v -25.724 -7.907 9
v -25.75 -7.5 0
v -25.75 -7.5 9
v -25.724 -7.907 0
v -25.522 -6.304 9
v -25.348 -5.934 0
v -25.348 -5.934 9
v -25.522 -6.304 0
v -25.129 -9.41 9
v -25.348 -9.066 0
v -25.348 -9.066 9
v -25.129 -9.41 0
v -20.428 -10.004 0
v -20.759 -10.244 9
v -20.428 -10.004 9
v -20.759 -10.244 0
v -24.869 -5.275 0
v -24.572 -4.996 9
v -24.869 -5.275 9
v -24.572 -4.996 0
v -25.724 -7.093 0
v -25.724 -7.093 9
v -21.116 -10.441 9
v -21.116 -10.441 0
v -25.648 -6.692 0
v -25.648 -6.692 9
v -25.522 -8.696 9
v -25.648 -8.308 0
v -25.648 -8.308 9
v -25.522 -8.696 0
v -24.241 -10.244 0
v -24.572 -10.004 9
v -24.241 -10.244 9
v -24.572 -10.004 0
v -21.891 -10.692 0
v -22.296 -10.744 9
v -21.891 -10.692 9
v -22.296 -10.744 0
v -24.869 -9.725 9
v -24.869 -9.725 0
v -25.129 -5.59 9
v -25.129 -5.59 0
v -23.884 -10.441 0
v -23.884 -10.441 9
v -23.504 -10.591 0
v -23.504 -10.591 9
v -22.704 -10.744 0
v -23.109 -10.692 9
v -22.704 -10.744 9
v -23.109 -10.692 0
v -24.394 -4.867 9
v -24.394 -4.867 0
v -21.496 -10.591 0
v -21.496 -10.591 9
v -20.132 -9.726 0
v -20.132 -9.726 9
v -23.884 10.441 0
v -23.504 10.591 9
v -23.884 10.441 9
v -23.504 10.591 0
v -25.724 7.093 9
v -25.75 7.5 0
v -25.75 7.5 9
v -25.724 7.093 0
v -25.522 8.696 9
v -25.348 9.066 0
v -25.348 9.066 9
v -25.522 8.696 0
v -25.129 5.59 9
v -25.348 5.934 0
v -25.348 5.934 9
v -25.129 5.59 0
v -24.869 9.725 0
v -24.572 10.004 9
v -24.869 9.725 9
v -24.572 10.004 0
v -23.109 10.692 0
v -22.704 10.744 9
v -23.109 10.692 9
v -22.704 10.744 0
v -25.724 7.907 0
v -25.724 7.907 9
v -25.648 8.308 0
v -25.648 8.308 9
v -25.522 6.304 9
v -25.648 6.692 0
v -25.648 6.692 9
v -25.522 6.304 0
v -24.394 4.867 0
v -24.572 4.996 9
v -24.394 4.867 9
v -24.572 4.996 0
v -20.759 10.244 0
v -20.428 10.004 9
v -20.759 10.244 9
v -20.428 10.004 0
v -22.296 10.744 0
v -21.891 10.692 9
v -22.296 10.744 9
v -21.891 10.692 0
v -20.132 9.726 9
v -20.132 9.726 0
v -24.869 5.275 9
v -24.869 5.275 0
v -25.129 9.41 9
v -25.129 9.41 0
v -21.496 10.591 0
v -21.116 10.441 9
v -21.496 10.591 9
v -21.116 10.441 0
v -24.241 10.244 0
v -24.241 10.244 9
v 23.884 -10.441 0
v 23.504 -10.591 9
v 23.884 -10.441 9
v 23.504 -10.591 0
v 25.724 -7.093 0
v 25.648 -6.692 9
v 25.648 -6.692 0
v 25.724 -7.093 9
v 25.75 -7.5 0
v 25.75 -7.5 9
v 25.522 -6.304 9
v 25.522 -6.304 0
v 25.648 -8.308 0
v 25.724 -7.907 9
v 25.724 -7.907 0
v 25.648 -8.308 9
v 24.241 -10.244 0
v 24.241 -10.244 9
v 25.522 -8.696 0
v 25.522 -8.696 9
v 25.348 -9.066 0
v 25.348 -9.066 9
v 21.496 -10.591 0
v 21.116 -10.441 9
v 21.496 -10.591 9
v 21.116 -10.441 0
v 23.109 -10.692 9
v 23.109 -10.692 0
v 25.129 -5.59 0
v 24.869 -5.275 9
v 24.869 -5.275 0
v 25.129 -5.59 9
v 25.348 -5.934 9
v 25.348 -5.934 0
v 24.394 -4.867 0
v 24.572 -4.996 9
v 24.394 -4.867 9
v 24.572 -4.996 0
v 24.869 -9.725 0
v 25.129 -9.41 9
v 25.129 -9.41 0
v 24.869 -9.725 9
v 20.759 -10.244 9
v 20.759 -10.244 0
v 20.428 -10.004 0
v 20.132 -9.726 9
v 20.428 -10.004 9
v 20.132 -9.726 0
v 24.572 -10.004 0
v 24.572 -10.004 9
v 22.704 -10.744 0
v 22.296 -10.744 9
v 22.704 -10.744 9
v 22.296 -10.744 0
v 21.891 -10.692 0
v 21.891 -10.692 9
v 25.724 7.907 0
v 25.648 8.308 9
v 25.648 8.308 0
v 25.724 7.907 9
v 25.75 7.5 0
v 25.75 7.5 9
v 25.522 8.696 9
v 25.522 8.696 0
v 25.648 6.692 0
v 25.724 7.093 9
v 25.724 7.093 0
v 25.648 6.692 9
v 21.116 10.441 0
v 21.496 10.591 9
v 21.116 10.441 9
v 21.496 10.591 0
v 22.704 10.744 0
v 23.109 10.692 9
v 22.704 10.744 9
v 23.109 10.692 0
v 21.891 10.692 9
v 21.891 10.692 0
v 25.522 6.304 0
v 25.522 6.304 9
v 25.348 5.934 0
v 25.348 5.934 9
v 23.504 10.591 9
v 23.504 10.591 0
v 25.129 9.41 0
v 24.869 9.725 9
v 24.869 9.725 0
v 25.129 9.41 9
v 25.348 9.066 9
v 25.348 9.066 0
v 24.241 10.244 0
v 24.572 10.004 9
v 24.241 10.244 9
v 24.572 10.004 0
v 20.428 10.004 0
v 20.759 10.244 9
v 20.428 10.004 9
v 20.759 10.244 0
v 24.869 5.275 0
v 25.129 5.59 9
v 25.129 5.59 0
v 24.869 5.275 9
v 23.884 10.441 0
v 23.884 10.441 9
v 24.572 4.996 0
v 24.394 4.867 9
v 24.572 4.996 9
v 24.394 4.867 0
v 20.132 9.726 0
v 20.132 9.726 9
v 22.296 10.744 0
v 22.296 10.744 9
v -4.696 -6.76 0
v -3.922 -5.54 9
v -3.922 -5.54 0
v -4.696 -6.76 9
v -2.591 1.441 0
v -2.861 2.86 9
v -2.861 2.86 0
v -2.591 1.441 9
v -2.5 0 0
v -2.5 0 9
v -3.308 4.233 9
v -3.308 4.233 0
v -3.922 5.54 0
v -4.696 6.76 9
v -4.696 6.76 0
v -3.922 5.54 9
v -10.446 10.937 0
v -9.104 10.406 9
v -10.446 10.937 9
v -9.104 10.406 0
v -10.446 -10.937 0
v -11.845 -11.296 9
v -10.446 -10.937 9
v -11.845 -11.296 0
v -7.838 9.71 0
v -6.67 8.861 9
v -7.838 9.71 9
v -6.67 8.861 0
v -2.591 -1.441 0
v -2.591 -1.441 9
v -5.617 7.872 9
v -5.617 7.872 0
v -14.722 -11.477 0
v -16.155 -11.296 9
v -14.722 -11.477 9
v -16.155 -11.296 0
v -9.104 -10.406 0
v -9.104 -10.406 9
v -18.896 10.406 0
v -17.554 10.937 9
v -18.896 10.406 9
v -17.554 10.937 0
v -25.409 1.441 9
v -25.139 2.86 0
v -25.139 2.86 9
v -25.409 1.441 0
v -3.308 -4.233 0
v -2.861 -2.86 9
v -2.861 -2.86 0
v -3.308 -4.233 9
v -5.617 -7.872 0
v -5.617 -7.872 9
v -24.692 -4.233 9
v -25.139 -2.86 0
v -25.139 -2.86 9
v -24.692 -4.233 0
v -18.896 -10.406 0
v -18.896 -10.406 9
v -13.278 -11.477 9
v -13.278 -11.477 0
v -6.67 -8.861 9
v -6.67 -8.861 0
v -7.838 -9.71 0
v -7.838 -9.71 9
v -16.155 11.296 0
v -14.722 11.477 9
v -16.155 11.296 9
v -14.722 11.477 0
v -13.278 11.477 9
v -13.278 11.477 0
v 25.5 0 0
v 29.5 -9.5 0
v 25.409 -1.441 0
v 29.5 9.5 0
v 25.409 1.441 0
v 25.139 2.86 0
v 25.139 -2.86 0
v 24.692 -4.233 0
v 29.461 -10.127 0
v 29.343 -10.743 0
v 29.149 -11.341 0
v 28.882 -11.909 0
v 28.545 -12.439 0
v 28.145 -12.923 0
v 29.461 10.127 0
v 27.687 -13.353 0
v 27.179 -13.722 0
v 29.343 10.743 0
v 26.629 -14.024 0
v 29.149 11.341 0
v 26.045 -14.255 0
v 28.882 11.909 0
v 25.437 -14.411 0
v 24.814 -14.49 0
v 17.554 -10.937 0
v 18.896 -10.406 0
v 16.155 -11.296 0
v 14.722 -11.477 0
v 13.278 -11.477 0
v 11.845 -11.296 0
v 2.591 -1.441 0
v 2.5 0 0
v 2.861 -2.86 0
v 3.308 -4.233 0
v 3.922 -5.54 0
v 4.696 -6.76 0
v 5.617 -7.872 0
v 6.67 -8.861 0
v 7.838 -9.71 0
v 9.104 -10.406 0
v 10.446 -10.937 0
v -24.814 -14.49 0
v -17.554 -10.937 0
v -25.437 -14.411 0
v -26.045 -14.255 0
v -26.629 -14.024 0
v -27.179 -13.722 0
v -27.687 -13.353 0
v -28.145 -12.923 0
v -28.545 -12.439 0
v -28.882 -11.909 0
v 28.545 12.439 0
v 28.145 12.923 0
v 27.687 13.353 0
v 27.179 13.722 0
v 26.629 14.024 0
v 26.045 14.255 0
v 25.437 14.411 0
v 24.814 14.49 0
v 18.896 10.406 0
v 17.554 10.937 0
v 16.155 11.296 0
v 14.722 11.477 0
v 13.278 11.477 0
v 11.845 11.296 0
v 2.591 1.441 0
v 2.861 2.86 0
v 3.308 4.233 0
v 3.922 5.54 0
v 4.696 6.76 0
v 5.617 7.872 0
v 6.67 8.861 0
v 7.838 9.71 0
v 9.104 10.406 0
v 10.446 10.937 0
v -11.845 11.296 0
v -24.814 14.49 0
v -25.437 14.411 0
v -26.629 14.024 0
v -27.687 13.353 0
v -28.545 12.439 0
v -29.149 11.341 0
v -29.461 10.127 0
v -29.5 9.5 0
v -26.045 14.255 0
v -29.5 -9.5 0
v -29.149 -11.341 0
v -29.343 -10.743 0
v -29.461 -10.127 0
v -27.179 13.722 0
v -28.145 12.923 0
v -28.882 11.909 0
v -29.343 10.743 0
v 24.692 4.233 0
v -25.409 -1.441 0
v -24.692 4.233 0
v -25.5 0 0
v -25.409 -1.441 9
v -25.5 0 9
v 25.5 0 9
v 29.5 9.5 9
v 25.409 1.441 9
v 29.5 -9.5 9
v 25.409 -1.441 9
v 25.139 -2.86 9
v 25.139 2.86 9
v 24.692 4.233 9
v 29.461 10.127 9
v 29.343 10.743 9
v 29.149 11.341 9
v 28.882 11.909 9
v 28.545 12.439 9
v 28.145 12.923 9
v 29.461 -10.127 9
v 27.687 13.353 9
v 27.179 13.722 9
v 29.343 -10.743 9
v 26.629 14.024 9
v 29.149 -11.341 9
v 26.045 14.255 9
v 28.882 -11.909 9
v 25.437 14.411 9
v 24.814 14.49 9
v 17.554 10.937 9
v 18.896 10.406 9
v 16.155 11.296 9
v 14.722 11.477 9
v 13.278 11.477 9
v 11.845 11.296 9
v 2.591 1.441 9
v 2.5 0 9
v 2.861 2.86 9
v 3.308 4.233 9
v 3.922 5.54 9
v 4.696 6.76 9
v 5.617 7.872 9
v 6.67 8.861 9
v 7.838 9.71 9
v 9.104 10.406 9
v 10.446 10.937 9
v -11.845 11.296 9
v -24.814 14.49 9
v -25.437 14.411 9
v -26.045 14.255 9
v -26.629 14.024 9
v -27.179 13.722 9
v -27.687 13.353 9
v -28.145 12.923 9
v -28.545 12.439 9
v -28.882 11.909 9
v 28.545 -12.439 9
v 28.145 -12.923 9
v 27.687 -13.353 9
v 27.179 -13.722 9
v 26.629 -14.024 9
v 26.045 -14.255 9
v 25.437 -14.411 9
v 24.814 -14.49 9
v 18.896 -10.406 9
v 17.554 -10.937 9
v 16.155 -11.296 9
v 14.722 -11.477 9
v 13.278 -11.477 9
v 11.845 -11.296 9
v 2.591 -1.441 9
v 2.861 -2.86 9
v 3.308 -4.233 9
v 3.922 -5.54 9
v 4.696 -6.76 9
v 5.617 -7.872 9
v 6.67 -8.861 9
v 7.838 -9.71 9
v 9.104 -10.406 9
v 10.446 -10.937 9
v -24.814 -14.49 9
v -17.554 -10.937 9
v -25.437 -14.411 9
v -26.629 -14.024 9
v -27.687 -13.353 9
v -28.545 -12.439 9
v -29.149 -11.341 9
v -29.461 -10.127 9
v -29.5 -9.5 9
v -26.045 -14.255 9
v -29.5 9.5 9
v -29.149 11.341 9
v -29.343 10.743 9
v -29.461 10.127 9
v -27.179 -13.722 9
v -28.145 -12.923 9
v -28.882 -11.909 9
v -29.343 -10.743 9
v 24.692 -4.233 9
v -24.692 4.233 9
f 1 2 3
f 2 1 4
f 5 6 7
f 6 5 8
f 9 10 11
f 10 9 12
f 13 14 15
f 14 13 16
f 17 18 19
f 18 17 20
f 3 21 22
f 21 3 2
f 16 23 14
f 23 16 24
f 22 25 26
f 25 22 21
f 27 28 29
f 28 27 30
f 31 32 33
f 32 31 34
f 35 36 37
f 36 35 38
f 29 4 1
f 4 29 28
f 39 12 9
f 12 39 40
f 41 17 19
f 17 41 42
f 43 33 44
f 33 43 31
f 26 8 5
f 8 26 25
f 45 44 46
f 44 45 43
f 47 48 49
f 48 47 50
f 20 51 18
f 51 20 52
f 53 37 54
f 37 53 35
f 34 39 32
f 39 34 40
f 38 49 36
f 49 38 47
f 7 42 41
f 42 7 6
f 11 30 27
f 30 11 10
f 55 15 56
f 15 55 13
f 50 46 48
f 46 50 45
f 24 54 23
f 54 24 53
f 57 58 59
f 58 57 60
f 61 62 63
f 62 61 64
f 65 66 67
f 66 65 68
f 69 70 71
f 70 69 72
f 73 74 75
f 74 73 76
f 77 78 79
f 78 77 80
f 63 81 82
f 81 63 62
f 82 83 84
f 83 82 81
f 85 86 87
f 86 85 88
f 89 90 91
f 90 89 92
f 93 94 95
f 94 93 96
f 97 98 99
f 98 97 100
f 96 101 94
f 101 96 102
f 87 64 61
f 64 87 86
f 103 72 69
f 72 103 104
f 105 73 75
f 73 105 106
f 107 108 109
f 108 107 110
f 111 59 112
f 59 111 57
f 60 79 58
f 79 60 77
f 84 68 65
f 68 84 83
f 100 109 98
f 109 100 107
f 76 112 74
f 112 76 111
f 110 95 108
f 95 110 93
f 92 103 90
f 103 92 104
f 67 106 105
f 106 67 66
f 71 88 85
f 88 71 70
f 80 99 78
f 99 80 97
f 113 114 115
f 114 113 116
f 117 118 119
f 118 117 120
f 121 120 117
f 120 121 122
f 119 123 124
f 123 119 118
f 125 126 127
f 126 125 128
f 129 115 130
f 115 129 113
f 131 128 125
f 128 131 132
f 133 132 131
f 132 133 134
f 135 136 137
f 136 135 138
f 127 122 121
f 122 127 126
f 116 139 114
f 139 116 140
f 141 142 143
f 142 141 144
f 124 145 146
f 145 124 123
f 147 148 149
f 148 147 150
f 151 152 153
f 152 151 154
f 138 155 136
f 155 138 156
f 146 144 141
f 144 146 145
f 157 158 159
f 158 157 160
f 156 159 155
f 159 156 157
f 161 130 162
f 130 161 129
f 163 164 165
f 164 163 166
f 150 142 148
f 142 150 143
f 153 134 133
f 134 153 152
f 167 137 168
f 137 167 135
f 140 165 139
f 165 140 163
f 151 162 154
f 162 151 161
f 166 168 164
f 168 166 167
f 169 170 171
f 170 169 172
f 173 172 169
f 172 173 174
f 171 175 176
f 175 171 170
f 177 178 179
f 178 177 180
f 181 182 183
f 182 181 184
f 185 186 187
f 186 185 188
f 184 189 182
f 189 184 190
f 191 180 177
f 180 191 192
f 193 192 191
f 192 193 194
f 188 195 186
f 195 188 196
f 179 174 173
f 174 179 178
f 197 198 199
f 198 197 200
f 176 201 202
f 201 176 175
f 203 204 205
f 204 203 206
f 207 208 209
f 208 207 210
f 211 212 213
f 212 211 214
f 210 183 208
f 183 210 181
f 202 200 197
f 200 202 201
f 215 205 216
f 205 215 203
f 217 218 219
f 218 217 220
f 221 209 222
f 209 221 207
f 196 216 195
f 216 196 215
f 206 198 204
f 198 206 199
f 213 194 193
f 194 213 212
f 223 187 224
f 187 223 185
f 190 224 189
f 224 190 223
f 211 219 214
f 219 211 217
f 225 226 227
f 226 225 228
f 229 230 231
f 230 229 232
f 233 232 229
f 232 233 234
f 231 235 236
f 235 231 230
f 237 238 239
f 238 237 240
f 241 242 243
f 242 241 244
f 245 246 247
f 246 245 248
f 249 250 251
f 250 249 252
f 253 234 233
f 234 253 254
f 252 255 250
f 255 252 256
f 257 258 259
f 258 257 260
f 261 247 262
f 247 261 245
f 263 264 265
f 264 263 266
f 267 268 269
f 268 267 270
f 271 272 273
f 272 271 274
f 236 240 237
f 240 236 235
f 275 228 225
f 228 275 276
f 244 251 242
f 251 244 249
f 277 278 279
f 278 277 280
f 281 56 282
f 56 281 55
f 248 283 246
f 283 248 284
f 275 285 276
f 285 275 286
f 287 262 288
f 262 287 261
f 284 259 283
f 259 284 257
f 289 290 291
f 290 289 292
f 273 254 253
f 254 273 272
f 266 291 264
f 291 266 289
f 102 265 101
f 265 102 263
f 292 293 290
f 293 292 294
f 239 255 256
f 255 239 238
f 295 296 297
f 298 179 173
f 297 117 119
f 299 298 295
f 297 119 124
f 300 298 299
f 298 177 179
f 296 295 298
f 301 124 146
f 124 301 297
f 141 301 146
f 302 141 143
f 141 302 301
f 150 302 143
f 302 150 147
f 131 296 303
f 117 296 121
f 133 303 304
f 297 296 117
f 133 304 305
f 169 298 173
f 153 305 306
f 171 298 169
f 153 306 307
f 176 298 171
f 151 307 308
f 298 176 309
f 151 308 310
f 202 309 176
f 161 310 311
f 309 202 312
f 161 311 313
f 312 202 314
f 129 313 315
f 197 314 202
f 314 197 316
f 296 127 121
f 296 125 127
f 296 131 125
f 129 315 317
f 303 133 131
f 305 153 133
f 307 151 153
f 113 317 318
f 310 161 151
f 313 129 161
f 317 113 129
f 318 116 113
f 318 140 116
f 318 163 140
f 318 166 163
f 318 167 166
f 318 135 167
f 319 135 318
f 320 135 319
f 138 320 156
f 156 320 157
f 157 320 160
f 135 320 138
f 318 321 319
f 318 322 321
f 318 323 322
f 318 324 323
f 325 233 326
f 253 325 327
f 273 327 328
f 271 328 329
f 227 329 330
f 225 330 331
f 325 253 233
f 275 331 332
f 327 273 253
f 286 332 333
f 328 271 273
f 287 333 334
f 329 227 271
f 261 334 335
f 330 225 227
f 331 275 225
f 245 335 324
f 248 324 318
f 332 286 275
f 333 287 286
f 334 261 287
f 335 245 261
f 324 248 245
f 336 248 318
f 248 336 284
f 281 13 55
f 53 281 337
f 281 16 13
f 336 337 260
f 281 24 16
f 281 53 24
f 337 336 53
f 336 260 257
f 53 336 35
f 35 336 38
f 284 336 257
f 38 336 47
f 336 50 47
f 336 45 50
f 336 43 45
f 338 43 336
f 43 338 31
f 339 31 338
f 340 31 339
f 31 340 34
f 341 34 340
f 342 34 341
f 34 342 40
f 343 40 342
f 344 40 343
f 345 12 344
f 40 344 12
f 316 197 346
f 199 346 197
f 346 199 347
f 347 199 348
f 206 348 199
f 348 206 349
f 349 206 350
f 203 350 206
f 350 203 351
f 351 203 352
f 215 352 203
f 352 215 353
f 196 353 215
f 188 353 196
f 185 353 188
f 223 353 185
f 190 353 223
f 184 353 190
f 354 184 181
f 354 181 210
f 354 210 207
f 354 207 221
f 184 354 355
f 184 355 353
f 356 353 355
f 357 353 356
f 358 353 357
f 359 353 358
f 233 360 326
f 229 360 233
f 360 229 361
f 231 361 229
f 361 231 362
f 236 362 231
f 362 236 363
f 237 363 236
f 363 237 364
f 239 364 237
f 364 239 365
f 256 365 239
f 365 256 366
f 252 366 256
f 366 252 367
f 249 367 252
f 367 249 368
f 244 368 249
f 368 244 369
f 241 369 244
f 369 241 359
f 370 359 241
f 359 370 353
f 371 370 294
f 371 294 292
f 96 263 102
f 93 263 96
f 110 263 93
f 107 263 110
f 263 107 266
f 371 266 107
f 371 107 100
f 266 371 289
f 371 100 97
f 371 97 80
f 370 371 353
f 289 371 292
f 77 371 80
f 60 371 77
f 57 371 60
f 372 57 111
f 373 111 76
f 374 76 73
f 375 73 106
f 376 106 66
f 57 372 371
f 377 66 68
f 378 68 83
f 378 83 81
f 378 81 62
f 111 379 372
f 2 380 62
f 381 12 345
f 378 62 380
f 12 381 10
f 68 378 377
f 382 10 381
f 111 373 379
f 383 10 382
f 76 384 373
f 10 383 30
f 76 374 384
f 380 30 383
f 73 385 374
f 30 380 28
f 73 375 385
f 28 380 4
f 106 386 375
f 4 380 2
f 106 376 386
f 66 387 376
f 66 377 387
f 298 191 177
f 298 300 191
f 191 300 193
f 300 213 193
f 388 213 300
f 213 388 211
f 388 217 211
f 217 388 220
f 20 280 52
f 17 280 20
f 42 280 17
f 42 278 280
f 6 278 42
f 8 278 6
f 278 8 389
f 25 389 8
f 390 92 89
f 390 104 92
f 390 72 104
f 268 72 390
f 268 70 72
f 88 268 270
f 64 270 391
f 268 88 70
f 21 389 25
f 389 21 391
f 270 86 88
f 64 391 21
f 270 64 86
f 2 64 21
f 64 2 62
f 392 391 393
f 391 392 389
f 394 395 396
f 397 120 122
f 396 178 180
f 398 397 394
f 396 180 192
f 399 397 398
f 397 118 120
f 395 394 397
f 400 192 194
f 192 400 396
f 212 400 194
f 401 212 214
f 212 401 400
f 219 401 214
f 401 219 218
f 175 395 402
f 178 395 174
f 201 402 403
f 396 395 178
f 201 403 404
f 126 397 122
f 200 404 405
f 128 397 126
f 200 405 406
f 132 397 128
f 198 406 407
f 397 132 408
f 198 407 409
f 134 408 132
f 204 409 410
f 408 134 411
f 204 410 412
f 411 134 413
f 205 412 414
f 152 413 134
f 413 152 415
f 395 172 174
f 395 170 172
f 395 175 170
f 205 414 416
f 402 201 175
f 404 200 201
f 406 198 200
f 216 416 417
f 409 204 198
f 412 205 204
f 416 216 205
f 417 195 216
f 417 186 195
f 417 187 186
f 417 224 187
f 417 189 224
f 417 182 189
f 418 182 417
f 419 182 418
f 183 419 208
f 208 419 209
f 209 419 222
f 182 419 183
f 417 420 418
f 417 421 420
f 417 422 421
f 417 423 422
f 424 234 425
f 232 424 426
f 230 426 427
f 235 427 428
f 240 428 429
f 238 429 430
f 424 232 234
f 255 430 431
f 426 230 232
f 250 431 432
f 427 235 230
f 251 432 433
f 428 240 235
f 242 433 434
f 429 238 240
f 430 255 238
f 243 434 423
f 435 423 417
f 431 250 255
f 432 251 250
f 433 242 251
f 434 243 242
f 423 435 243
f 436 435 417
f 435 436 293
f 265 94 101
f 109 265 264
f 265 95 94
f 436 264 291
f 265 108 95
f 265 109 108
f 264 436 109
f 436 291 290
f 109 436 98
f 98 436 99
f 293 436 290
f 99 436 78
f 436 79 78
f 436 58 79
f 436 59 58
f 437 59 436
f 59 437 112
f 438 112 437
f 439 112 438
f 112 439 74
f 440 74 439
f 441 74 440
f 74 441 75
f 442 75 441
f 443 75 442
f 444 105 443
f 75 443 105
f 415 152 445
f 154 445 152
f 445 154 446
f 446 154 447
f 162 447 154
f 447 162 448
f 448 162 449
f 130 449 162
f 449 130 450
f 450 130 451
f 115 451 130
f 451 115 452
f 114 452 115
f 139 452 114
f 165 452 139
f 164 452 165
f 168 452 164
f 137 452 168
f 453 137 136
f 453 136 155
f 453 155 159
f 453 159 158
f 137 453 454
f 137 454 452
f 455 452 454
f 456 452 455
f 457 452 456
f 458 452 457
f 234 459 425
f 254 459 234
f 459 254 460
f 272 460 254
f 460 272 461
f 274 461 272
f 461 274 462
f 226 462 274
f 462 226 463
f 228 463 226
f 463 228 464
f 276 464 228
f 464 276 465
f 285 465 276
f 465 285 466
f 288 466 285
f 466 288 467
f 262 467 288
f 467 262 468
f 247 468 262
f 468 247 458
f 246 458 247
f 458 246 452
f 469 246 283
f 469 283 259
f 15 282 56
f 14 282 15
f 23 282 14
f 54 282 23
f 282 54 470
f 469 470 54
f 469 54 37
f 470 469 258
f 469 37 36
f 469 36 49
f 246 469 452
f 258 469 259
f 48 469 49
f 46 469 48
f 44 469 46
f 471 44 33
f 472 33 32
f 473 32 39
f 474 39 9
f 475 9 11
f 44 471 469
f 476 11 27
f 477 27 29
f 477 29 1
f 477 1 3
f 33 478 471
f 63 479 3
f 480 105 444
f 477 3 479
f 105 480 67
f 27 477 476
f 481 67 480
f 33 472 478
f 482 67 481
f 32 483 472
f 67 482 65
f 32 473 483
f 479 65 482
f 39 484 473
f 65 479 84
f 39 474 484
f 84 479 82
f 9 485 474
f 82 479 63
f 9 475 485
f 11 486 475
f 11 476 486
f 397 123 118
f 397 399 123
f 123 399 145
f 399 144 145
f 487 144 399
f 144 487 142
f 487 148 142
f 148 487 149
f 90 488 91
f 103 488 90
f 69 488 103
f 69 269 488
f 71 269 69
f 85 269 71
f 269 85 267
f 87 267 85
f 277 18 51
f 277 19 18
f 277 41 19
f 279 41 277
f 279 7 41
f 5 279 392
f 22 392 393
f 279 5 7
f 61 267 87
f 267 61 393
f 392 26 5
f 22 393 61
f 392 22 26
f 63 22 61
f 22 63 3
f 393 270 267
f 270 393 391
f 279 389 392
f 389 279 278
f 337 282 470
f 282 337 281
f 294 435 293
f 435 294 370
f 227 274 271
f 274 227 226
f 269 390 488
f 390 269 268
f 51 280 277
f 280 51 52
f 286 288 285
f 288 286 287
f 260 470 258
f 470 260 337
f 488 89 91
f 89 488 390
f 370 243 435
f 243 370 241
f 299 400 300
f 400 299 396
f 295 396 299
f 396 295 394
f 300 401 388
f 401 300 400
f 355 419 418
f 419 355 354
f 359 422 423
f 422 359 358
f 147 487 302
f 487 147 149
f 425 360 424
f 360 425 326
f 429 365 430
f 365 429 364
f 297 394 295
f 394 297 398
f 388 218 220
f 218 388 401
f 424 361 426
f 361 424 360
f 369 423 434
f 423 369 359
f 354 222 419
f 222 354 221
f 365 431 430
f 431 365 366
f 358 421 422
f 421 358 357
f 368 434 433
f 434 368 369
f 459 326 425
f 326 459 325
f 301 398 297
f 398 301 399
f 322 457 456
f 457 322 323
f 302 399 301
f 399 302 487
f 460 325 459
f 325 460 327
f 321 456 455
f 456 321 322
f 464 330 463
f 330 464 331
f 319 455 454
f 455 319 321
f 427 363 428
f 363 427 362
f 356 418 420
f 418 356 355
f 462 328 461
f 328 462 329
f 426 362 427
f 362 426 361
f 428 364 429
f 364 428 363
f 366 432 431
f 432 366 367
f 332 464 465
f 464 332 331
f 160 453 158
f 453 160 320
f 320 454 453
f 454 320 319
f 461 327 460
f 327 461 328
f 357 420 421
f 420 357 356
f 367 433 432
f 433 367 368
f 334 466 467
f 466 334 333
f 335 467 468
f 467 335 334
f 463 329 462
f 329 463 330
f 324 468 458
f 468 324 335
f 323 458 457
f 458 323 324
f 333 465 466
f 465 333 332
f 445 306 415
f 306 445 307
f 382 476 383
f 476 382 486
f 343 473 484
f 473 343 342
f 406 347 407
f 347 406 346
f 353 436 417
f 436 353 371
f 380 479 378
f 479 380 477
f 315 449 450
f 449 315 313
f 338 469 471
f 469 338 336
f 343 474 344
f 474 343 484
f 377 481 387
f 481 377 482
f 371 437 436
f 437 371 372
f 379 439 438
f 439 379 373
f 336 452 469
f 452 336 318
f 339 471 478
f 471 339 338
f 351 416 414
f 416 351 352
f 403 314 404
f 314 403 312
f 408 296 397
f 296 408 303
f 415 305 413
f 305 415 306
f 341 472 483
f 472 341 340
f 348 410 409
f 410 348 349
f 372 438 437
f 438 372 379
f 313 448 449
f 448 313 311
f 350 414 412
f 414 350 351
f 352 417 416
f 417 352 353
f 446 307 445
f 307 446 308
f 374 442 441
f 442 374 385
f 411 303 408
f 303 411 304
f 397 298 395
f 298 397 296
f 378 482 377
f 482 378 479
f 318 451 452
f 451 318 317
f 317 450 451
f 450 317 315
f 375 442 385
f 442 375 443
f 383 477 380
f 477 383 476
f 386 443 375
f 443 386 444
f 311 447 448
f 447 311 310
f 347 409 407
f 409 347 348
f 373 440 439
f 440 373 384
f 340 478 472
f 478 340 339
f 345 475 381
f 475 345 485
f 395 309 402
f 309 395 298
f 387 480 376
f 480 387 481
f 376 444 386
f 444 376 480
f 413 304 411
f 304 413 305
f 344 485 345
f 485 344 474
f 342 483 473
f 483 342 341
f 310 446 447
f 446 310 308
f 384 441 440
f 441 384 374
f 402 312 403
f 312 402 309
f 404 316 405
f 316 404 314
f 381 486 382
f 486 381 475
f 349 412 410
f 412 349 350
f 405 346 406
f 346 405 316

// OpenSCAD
$fn = 50;

difference() {
	union() {
		hull() {
			translate(v = [-24.5, 9.5, 0]) {
				cylinder(h = 9, r = 5);
			}
			translate(v = [24.5, 9.5, 0]) {
				cylinder(h = 9, r = 5);
			}
			translate(v = [-24.5, -9.5, 0]) {
				cylinder(h = 9, r = 5);
			}
			translate(v = [24.5, -9.5, 0]) {
				cylinder(h = 9, r = 5);
			}
		}
	}
	union() {
		translate(v = [-22.5, -7.5, -100.0]) {
			cylinder(h = 200, r = 3.25);
		}
		translate(v = [-22.5, 7.5, -100.0]) {
			cylinder(h = 200, r = 3.25);
		}
		translate(v = [22.5, -7.5, -100.0]) {
			cylinder(h = 200, r = 3.25);
		}
		translate(v = [22.5, 7.5, -100.0]) {
			cylinder(h = 200, r = 3.25);
		}
		translate(v = [-22.5, -7.5, -100.0]) {
			cylinder(h = 200, r = 1.8);
		}
		translate(v = [-22.5, 7.5, -100.0]) {
			cylinder(h = 200, r = 1.8);
		}
		translate(v = [22.5, -7.5, -100.0]) {
			cylinder(h = 200, r = 1.8);
		}
		translate(v = [22.5, 7.5, -100.0]) {
			cylinder(h = 200, r = 1.8);
		}
		translate(v = [-14.0, 0, 0.0]) {
			cylinder(h = 9, r = 11.5);
		}
		translate(v = [14.0, 0, 0.0]) {
			cylinder(h = 9, r = 11.5);
		}
	}
}
